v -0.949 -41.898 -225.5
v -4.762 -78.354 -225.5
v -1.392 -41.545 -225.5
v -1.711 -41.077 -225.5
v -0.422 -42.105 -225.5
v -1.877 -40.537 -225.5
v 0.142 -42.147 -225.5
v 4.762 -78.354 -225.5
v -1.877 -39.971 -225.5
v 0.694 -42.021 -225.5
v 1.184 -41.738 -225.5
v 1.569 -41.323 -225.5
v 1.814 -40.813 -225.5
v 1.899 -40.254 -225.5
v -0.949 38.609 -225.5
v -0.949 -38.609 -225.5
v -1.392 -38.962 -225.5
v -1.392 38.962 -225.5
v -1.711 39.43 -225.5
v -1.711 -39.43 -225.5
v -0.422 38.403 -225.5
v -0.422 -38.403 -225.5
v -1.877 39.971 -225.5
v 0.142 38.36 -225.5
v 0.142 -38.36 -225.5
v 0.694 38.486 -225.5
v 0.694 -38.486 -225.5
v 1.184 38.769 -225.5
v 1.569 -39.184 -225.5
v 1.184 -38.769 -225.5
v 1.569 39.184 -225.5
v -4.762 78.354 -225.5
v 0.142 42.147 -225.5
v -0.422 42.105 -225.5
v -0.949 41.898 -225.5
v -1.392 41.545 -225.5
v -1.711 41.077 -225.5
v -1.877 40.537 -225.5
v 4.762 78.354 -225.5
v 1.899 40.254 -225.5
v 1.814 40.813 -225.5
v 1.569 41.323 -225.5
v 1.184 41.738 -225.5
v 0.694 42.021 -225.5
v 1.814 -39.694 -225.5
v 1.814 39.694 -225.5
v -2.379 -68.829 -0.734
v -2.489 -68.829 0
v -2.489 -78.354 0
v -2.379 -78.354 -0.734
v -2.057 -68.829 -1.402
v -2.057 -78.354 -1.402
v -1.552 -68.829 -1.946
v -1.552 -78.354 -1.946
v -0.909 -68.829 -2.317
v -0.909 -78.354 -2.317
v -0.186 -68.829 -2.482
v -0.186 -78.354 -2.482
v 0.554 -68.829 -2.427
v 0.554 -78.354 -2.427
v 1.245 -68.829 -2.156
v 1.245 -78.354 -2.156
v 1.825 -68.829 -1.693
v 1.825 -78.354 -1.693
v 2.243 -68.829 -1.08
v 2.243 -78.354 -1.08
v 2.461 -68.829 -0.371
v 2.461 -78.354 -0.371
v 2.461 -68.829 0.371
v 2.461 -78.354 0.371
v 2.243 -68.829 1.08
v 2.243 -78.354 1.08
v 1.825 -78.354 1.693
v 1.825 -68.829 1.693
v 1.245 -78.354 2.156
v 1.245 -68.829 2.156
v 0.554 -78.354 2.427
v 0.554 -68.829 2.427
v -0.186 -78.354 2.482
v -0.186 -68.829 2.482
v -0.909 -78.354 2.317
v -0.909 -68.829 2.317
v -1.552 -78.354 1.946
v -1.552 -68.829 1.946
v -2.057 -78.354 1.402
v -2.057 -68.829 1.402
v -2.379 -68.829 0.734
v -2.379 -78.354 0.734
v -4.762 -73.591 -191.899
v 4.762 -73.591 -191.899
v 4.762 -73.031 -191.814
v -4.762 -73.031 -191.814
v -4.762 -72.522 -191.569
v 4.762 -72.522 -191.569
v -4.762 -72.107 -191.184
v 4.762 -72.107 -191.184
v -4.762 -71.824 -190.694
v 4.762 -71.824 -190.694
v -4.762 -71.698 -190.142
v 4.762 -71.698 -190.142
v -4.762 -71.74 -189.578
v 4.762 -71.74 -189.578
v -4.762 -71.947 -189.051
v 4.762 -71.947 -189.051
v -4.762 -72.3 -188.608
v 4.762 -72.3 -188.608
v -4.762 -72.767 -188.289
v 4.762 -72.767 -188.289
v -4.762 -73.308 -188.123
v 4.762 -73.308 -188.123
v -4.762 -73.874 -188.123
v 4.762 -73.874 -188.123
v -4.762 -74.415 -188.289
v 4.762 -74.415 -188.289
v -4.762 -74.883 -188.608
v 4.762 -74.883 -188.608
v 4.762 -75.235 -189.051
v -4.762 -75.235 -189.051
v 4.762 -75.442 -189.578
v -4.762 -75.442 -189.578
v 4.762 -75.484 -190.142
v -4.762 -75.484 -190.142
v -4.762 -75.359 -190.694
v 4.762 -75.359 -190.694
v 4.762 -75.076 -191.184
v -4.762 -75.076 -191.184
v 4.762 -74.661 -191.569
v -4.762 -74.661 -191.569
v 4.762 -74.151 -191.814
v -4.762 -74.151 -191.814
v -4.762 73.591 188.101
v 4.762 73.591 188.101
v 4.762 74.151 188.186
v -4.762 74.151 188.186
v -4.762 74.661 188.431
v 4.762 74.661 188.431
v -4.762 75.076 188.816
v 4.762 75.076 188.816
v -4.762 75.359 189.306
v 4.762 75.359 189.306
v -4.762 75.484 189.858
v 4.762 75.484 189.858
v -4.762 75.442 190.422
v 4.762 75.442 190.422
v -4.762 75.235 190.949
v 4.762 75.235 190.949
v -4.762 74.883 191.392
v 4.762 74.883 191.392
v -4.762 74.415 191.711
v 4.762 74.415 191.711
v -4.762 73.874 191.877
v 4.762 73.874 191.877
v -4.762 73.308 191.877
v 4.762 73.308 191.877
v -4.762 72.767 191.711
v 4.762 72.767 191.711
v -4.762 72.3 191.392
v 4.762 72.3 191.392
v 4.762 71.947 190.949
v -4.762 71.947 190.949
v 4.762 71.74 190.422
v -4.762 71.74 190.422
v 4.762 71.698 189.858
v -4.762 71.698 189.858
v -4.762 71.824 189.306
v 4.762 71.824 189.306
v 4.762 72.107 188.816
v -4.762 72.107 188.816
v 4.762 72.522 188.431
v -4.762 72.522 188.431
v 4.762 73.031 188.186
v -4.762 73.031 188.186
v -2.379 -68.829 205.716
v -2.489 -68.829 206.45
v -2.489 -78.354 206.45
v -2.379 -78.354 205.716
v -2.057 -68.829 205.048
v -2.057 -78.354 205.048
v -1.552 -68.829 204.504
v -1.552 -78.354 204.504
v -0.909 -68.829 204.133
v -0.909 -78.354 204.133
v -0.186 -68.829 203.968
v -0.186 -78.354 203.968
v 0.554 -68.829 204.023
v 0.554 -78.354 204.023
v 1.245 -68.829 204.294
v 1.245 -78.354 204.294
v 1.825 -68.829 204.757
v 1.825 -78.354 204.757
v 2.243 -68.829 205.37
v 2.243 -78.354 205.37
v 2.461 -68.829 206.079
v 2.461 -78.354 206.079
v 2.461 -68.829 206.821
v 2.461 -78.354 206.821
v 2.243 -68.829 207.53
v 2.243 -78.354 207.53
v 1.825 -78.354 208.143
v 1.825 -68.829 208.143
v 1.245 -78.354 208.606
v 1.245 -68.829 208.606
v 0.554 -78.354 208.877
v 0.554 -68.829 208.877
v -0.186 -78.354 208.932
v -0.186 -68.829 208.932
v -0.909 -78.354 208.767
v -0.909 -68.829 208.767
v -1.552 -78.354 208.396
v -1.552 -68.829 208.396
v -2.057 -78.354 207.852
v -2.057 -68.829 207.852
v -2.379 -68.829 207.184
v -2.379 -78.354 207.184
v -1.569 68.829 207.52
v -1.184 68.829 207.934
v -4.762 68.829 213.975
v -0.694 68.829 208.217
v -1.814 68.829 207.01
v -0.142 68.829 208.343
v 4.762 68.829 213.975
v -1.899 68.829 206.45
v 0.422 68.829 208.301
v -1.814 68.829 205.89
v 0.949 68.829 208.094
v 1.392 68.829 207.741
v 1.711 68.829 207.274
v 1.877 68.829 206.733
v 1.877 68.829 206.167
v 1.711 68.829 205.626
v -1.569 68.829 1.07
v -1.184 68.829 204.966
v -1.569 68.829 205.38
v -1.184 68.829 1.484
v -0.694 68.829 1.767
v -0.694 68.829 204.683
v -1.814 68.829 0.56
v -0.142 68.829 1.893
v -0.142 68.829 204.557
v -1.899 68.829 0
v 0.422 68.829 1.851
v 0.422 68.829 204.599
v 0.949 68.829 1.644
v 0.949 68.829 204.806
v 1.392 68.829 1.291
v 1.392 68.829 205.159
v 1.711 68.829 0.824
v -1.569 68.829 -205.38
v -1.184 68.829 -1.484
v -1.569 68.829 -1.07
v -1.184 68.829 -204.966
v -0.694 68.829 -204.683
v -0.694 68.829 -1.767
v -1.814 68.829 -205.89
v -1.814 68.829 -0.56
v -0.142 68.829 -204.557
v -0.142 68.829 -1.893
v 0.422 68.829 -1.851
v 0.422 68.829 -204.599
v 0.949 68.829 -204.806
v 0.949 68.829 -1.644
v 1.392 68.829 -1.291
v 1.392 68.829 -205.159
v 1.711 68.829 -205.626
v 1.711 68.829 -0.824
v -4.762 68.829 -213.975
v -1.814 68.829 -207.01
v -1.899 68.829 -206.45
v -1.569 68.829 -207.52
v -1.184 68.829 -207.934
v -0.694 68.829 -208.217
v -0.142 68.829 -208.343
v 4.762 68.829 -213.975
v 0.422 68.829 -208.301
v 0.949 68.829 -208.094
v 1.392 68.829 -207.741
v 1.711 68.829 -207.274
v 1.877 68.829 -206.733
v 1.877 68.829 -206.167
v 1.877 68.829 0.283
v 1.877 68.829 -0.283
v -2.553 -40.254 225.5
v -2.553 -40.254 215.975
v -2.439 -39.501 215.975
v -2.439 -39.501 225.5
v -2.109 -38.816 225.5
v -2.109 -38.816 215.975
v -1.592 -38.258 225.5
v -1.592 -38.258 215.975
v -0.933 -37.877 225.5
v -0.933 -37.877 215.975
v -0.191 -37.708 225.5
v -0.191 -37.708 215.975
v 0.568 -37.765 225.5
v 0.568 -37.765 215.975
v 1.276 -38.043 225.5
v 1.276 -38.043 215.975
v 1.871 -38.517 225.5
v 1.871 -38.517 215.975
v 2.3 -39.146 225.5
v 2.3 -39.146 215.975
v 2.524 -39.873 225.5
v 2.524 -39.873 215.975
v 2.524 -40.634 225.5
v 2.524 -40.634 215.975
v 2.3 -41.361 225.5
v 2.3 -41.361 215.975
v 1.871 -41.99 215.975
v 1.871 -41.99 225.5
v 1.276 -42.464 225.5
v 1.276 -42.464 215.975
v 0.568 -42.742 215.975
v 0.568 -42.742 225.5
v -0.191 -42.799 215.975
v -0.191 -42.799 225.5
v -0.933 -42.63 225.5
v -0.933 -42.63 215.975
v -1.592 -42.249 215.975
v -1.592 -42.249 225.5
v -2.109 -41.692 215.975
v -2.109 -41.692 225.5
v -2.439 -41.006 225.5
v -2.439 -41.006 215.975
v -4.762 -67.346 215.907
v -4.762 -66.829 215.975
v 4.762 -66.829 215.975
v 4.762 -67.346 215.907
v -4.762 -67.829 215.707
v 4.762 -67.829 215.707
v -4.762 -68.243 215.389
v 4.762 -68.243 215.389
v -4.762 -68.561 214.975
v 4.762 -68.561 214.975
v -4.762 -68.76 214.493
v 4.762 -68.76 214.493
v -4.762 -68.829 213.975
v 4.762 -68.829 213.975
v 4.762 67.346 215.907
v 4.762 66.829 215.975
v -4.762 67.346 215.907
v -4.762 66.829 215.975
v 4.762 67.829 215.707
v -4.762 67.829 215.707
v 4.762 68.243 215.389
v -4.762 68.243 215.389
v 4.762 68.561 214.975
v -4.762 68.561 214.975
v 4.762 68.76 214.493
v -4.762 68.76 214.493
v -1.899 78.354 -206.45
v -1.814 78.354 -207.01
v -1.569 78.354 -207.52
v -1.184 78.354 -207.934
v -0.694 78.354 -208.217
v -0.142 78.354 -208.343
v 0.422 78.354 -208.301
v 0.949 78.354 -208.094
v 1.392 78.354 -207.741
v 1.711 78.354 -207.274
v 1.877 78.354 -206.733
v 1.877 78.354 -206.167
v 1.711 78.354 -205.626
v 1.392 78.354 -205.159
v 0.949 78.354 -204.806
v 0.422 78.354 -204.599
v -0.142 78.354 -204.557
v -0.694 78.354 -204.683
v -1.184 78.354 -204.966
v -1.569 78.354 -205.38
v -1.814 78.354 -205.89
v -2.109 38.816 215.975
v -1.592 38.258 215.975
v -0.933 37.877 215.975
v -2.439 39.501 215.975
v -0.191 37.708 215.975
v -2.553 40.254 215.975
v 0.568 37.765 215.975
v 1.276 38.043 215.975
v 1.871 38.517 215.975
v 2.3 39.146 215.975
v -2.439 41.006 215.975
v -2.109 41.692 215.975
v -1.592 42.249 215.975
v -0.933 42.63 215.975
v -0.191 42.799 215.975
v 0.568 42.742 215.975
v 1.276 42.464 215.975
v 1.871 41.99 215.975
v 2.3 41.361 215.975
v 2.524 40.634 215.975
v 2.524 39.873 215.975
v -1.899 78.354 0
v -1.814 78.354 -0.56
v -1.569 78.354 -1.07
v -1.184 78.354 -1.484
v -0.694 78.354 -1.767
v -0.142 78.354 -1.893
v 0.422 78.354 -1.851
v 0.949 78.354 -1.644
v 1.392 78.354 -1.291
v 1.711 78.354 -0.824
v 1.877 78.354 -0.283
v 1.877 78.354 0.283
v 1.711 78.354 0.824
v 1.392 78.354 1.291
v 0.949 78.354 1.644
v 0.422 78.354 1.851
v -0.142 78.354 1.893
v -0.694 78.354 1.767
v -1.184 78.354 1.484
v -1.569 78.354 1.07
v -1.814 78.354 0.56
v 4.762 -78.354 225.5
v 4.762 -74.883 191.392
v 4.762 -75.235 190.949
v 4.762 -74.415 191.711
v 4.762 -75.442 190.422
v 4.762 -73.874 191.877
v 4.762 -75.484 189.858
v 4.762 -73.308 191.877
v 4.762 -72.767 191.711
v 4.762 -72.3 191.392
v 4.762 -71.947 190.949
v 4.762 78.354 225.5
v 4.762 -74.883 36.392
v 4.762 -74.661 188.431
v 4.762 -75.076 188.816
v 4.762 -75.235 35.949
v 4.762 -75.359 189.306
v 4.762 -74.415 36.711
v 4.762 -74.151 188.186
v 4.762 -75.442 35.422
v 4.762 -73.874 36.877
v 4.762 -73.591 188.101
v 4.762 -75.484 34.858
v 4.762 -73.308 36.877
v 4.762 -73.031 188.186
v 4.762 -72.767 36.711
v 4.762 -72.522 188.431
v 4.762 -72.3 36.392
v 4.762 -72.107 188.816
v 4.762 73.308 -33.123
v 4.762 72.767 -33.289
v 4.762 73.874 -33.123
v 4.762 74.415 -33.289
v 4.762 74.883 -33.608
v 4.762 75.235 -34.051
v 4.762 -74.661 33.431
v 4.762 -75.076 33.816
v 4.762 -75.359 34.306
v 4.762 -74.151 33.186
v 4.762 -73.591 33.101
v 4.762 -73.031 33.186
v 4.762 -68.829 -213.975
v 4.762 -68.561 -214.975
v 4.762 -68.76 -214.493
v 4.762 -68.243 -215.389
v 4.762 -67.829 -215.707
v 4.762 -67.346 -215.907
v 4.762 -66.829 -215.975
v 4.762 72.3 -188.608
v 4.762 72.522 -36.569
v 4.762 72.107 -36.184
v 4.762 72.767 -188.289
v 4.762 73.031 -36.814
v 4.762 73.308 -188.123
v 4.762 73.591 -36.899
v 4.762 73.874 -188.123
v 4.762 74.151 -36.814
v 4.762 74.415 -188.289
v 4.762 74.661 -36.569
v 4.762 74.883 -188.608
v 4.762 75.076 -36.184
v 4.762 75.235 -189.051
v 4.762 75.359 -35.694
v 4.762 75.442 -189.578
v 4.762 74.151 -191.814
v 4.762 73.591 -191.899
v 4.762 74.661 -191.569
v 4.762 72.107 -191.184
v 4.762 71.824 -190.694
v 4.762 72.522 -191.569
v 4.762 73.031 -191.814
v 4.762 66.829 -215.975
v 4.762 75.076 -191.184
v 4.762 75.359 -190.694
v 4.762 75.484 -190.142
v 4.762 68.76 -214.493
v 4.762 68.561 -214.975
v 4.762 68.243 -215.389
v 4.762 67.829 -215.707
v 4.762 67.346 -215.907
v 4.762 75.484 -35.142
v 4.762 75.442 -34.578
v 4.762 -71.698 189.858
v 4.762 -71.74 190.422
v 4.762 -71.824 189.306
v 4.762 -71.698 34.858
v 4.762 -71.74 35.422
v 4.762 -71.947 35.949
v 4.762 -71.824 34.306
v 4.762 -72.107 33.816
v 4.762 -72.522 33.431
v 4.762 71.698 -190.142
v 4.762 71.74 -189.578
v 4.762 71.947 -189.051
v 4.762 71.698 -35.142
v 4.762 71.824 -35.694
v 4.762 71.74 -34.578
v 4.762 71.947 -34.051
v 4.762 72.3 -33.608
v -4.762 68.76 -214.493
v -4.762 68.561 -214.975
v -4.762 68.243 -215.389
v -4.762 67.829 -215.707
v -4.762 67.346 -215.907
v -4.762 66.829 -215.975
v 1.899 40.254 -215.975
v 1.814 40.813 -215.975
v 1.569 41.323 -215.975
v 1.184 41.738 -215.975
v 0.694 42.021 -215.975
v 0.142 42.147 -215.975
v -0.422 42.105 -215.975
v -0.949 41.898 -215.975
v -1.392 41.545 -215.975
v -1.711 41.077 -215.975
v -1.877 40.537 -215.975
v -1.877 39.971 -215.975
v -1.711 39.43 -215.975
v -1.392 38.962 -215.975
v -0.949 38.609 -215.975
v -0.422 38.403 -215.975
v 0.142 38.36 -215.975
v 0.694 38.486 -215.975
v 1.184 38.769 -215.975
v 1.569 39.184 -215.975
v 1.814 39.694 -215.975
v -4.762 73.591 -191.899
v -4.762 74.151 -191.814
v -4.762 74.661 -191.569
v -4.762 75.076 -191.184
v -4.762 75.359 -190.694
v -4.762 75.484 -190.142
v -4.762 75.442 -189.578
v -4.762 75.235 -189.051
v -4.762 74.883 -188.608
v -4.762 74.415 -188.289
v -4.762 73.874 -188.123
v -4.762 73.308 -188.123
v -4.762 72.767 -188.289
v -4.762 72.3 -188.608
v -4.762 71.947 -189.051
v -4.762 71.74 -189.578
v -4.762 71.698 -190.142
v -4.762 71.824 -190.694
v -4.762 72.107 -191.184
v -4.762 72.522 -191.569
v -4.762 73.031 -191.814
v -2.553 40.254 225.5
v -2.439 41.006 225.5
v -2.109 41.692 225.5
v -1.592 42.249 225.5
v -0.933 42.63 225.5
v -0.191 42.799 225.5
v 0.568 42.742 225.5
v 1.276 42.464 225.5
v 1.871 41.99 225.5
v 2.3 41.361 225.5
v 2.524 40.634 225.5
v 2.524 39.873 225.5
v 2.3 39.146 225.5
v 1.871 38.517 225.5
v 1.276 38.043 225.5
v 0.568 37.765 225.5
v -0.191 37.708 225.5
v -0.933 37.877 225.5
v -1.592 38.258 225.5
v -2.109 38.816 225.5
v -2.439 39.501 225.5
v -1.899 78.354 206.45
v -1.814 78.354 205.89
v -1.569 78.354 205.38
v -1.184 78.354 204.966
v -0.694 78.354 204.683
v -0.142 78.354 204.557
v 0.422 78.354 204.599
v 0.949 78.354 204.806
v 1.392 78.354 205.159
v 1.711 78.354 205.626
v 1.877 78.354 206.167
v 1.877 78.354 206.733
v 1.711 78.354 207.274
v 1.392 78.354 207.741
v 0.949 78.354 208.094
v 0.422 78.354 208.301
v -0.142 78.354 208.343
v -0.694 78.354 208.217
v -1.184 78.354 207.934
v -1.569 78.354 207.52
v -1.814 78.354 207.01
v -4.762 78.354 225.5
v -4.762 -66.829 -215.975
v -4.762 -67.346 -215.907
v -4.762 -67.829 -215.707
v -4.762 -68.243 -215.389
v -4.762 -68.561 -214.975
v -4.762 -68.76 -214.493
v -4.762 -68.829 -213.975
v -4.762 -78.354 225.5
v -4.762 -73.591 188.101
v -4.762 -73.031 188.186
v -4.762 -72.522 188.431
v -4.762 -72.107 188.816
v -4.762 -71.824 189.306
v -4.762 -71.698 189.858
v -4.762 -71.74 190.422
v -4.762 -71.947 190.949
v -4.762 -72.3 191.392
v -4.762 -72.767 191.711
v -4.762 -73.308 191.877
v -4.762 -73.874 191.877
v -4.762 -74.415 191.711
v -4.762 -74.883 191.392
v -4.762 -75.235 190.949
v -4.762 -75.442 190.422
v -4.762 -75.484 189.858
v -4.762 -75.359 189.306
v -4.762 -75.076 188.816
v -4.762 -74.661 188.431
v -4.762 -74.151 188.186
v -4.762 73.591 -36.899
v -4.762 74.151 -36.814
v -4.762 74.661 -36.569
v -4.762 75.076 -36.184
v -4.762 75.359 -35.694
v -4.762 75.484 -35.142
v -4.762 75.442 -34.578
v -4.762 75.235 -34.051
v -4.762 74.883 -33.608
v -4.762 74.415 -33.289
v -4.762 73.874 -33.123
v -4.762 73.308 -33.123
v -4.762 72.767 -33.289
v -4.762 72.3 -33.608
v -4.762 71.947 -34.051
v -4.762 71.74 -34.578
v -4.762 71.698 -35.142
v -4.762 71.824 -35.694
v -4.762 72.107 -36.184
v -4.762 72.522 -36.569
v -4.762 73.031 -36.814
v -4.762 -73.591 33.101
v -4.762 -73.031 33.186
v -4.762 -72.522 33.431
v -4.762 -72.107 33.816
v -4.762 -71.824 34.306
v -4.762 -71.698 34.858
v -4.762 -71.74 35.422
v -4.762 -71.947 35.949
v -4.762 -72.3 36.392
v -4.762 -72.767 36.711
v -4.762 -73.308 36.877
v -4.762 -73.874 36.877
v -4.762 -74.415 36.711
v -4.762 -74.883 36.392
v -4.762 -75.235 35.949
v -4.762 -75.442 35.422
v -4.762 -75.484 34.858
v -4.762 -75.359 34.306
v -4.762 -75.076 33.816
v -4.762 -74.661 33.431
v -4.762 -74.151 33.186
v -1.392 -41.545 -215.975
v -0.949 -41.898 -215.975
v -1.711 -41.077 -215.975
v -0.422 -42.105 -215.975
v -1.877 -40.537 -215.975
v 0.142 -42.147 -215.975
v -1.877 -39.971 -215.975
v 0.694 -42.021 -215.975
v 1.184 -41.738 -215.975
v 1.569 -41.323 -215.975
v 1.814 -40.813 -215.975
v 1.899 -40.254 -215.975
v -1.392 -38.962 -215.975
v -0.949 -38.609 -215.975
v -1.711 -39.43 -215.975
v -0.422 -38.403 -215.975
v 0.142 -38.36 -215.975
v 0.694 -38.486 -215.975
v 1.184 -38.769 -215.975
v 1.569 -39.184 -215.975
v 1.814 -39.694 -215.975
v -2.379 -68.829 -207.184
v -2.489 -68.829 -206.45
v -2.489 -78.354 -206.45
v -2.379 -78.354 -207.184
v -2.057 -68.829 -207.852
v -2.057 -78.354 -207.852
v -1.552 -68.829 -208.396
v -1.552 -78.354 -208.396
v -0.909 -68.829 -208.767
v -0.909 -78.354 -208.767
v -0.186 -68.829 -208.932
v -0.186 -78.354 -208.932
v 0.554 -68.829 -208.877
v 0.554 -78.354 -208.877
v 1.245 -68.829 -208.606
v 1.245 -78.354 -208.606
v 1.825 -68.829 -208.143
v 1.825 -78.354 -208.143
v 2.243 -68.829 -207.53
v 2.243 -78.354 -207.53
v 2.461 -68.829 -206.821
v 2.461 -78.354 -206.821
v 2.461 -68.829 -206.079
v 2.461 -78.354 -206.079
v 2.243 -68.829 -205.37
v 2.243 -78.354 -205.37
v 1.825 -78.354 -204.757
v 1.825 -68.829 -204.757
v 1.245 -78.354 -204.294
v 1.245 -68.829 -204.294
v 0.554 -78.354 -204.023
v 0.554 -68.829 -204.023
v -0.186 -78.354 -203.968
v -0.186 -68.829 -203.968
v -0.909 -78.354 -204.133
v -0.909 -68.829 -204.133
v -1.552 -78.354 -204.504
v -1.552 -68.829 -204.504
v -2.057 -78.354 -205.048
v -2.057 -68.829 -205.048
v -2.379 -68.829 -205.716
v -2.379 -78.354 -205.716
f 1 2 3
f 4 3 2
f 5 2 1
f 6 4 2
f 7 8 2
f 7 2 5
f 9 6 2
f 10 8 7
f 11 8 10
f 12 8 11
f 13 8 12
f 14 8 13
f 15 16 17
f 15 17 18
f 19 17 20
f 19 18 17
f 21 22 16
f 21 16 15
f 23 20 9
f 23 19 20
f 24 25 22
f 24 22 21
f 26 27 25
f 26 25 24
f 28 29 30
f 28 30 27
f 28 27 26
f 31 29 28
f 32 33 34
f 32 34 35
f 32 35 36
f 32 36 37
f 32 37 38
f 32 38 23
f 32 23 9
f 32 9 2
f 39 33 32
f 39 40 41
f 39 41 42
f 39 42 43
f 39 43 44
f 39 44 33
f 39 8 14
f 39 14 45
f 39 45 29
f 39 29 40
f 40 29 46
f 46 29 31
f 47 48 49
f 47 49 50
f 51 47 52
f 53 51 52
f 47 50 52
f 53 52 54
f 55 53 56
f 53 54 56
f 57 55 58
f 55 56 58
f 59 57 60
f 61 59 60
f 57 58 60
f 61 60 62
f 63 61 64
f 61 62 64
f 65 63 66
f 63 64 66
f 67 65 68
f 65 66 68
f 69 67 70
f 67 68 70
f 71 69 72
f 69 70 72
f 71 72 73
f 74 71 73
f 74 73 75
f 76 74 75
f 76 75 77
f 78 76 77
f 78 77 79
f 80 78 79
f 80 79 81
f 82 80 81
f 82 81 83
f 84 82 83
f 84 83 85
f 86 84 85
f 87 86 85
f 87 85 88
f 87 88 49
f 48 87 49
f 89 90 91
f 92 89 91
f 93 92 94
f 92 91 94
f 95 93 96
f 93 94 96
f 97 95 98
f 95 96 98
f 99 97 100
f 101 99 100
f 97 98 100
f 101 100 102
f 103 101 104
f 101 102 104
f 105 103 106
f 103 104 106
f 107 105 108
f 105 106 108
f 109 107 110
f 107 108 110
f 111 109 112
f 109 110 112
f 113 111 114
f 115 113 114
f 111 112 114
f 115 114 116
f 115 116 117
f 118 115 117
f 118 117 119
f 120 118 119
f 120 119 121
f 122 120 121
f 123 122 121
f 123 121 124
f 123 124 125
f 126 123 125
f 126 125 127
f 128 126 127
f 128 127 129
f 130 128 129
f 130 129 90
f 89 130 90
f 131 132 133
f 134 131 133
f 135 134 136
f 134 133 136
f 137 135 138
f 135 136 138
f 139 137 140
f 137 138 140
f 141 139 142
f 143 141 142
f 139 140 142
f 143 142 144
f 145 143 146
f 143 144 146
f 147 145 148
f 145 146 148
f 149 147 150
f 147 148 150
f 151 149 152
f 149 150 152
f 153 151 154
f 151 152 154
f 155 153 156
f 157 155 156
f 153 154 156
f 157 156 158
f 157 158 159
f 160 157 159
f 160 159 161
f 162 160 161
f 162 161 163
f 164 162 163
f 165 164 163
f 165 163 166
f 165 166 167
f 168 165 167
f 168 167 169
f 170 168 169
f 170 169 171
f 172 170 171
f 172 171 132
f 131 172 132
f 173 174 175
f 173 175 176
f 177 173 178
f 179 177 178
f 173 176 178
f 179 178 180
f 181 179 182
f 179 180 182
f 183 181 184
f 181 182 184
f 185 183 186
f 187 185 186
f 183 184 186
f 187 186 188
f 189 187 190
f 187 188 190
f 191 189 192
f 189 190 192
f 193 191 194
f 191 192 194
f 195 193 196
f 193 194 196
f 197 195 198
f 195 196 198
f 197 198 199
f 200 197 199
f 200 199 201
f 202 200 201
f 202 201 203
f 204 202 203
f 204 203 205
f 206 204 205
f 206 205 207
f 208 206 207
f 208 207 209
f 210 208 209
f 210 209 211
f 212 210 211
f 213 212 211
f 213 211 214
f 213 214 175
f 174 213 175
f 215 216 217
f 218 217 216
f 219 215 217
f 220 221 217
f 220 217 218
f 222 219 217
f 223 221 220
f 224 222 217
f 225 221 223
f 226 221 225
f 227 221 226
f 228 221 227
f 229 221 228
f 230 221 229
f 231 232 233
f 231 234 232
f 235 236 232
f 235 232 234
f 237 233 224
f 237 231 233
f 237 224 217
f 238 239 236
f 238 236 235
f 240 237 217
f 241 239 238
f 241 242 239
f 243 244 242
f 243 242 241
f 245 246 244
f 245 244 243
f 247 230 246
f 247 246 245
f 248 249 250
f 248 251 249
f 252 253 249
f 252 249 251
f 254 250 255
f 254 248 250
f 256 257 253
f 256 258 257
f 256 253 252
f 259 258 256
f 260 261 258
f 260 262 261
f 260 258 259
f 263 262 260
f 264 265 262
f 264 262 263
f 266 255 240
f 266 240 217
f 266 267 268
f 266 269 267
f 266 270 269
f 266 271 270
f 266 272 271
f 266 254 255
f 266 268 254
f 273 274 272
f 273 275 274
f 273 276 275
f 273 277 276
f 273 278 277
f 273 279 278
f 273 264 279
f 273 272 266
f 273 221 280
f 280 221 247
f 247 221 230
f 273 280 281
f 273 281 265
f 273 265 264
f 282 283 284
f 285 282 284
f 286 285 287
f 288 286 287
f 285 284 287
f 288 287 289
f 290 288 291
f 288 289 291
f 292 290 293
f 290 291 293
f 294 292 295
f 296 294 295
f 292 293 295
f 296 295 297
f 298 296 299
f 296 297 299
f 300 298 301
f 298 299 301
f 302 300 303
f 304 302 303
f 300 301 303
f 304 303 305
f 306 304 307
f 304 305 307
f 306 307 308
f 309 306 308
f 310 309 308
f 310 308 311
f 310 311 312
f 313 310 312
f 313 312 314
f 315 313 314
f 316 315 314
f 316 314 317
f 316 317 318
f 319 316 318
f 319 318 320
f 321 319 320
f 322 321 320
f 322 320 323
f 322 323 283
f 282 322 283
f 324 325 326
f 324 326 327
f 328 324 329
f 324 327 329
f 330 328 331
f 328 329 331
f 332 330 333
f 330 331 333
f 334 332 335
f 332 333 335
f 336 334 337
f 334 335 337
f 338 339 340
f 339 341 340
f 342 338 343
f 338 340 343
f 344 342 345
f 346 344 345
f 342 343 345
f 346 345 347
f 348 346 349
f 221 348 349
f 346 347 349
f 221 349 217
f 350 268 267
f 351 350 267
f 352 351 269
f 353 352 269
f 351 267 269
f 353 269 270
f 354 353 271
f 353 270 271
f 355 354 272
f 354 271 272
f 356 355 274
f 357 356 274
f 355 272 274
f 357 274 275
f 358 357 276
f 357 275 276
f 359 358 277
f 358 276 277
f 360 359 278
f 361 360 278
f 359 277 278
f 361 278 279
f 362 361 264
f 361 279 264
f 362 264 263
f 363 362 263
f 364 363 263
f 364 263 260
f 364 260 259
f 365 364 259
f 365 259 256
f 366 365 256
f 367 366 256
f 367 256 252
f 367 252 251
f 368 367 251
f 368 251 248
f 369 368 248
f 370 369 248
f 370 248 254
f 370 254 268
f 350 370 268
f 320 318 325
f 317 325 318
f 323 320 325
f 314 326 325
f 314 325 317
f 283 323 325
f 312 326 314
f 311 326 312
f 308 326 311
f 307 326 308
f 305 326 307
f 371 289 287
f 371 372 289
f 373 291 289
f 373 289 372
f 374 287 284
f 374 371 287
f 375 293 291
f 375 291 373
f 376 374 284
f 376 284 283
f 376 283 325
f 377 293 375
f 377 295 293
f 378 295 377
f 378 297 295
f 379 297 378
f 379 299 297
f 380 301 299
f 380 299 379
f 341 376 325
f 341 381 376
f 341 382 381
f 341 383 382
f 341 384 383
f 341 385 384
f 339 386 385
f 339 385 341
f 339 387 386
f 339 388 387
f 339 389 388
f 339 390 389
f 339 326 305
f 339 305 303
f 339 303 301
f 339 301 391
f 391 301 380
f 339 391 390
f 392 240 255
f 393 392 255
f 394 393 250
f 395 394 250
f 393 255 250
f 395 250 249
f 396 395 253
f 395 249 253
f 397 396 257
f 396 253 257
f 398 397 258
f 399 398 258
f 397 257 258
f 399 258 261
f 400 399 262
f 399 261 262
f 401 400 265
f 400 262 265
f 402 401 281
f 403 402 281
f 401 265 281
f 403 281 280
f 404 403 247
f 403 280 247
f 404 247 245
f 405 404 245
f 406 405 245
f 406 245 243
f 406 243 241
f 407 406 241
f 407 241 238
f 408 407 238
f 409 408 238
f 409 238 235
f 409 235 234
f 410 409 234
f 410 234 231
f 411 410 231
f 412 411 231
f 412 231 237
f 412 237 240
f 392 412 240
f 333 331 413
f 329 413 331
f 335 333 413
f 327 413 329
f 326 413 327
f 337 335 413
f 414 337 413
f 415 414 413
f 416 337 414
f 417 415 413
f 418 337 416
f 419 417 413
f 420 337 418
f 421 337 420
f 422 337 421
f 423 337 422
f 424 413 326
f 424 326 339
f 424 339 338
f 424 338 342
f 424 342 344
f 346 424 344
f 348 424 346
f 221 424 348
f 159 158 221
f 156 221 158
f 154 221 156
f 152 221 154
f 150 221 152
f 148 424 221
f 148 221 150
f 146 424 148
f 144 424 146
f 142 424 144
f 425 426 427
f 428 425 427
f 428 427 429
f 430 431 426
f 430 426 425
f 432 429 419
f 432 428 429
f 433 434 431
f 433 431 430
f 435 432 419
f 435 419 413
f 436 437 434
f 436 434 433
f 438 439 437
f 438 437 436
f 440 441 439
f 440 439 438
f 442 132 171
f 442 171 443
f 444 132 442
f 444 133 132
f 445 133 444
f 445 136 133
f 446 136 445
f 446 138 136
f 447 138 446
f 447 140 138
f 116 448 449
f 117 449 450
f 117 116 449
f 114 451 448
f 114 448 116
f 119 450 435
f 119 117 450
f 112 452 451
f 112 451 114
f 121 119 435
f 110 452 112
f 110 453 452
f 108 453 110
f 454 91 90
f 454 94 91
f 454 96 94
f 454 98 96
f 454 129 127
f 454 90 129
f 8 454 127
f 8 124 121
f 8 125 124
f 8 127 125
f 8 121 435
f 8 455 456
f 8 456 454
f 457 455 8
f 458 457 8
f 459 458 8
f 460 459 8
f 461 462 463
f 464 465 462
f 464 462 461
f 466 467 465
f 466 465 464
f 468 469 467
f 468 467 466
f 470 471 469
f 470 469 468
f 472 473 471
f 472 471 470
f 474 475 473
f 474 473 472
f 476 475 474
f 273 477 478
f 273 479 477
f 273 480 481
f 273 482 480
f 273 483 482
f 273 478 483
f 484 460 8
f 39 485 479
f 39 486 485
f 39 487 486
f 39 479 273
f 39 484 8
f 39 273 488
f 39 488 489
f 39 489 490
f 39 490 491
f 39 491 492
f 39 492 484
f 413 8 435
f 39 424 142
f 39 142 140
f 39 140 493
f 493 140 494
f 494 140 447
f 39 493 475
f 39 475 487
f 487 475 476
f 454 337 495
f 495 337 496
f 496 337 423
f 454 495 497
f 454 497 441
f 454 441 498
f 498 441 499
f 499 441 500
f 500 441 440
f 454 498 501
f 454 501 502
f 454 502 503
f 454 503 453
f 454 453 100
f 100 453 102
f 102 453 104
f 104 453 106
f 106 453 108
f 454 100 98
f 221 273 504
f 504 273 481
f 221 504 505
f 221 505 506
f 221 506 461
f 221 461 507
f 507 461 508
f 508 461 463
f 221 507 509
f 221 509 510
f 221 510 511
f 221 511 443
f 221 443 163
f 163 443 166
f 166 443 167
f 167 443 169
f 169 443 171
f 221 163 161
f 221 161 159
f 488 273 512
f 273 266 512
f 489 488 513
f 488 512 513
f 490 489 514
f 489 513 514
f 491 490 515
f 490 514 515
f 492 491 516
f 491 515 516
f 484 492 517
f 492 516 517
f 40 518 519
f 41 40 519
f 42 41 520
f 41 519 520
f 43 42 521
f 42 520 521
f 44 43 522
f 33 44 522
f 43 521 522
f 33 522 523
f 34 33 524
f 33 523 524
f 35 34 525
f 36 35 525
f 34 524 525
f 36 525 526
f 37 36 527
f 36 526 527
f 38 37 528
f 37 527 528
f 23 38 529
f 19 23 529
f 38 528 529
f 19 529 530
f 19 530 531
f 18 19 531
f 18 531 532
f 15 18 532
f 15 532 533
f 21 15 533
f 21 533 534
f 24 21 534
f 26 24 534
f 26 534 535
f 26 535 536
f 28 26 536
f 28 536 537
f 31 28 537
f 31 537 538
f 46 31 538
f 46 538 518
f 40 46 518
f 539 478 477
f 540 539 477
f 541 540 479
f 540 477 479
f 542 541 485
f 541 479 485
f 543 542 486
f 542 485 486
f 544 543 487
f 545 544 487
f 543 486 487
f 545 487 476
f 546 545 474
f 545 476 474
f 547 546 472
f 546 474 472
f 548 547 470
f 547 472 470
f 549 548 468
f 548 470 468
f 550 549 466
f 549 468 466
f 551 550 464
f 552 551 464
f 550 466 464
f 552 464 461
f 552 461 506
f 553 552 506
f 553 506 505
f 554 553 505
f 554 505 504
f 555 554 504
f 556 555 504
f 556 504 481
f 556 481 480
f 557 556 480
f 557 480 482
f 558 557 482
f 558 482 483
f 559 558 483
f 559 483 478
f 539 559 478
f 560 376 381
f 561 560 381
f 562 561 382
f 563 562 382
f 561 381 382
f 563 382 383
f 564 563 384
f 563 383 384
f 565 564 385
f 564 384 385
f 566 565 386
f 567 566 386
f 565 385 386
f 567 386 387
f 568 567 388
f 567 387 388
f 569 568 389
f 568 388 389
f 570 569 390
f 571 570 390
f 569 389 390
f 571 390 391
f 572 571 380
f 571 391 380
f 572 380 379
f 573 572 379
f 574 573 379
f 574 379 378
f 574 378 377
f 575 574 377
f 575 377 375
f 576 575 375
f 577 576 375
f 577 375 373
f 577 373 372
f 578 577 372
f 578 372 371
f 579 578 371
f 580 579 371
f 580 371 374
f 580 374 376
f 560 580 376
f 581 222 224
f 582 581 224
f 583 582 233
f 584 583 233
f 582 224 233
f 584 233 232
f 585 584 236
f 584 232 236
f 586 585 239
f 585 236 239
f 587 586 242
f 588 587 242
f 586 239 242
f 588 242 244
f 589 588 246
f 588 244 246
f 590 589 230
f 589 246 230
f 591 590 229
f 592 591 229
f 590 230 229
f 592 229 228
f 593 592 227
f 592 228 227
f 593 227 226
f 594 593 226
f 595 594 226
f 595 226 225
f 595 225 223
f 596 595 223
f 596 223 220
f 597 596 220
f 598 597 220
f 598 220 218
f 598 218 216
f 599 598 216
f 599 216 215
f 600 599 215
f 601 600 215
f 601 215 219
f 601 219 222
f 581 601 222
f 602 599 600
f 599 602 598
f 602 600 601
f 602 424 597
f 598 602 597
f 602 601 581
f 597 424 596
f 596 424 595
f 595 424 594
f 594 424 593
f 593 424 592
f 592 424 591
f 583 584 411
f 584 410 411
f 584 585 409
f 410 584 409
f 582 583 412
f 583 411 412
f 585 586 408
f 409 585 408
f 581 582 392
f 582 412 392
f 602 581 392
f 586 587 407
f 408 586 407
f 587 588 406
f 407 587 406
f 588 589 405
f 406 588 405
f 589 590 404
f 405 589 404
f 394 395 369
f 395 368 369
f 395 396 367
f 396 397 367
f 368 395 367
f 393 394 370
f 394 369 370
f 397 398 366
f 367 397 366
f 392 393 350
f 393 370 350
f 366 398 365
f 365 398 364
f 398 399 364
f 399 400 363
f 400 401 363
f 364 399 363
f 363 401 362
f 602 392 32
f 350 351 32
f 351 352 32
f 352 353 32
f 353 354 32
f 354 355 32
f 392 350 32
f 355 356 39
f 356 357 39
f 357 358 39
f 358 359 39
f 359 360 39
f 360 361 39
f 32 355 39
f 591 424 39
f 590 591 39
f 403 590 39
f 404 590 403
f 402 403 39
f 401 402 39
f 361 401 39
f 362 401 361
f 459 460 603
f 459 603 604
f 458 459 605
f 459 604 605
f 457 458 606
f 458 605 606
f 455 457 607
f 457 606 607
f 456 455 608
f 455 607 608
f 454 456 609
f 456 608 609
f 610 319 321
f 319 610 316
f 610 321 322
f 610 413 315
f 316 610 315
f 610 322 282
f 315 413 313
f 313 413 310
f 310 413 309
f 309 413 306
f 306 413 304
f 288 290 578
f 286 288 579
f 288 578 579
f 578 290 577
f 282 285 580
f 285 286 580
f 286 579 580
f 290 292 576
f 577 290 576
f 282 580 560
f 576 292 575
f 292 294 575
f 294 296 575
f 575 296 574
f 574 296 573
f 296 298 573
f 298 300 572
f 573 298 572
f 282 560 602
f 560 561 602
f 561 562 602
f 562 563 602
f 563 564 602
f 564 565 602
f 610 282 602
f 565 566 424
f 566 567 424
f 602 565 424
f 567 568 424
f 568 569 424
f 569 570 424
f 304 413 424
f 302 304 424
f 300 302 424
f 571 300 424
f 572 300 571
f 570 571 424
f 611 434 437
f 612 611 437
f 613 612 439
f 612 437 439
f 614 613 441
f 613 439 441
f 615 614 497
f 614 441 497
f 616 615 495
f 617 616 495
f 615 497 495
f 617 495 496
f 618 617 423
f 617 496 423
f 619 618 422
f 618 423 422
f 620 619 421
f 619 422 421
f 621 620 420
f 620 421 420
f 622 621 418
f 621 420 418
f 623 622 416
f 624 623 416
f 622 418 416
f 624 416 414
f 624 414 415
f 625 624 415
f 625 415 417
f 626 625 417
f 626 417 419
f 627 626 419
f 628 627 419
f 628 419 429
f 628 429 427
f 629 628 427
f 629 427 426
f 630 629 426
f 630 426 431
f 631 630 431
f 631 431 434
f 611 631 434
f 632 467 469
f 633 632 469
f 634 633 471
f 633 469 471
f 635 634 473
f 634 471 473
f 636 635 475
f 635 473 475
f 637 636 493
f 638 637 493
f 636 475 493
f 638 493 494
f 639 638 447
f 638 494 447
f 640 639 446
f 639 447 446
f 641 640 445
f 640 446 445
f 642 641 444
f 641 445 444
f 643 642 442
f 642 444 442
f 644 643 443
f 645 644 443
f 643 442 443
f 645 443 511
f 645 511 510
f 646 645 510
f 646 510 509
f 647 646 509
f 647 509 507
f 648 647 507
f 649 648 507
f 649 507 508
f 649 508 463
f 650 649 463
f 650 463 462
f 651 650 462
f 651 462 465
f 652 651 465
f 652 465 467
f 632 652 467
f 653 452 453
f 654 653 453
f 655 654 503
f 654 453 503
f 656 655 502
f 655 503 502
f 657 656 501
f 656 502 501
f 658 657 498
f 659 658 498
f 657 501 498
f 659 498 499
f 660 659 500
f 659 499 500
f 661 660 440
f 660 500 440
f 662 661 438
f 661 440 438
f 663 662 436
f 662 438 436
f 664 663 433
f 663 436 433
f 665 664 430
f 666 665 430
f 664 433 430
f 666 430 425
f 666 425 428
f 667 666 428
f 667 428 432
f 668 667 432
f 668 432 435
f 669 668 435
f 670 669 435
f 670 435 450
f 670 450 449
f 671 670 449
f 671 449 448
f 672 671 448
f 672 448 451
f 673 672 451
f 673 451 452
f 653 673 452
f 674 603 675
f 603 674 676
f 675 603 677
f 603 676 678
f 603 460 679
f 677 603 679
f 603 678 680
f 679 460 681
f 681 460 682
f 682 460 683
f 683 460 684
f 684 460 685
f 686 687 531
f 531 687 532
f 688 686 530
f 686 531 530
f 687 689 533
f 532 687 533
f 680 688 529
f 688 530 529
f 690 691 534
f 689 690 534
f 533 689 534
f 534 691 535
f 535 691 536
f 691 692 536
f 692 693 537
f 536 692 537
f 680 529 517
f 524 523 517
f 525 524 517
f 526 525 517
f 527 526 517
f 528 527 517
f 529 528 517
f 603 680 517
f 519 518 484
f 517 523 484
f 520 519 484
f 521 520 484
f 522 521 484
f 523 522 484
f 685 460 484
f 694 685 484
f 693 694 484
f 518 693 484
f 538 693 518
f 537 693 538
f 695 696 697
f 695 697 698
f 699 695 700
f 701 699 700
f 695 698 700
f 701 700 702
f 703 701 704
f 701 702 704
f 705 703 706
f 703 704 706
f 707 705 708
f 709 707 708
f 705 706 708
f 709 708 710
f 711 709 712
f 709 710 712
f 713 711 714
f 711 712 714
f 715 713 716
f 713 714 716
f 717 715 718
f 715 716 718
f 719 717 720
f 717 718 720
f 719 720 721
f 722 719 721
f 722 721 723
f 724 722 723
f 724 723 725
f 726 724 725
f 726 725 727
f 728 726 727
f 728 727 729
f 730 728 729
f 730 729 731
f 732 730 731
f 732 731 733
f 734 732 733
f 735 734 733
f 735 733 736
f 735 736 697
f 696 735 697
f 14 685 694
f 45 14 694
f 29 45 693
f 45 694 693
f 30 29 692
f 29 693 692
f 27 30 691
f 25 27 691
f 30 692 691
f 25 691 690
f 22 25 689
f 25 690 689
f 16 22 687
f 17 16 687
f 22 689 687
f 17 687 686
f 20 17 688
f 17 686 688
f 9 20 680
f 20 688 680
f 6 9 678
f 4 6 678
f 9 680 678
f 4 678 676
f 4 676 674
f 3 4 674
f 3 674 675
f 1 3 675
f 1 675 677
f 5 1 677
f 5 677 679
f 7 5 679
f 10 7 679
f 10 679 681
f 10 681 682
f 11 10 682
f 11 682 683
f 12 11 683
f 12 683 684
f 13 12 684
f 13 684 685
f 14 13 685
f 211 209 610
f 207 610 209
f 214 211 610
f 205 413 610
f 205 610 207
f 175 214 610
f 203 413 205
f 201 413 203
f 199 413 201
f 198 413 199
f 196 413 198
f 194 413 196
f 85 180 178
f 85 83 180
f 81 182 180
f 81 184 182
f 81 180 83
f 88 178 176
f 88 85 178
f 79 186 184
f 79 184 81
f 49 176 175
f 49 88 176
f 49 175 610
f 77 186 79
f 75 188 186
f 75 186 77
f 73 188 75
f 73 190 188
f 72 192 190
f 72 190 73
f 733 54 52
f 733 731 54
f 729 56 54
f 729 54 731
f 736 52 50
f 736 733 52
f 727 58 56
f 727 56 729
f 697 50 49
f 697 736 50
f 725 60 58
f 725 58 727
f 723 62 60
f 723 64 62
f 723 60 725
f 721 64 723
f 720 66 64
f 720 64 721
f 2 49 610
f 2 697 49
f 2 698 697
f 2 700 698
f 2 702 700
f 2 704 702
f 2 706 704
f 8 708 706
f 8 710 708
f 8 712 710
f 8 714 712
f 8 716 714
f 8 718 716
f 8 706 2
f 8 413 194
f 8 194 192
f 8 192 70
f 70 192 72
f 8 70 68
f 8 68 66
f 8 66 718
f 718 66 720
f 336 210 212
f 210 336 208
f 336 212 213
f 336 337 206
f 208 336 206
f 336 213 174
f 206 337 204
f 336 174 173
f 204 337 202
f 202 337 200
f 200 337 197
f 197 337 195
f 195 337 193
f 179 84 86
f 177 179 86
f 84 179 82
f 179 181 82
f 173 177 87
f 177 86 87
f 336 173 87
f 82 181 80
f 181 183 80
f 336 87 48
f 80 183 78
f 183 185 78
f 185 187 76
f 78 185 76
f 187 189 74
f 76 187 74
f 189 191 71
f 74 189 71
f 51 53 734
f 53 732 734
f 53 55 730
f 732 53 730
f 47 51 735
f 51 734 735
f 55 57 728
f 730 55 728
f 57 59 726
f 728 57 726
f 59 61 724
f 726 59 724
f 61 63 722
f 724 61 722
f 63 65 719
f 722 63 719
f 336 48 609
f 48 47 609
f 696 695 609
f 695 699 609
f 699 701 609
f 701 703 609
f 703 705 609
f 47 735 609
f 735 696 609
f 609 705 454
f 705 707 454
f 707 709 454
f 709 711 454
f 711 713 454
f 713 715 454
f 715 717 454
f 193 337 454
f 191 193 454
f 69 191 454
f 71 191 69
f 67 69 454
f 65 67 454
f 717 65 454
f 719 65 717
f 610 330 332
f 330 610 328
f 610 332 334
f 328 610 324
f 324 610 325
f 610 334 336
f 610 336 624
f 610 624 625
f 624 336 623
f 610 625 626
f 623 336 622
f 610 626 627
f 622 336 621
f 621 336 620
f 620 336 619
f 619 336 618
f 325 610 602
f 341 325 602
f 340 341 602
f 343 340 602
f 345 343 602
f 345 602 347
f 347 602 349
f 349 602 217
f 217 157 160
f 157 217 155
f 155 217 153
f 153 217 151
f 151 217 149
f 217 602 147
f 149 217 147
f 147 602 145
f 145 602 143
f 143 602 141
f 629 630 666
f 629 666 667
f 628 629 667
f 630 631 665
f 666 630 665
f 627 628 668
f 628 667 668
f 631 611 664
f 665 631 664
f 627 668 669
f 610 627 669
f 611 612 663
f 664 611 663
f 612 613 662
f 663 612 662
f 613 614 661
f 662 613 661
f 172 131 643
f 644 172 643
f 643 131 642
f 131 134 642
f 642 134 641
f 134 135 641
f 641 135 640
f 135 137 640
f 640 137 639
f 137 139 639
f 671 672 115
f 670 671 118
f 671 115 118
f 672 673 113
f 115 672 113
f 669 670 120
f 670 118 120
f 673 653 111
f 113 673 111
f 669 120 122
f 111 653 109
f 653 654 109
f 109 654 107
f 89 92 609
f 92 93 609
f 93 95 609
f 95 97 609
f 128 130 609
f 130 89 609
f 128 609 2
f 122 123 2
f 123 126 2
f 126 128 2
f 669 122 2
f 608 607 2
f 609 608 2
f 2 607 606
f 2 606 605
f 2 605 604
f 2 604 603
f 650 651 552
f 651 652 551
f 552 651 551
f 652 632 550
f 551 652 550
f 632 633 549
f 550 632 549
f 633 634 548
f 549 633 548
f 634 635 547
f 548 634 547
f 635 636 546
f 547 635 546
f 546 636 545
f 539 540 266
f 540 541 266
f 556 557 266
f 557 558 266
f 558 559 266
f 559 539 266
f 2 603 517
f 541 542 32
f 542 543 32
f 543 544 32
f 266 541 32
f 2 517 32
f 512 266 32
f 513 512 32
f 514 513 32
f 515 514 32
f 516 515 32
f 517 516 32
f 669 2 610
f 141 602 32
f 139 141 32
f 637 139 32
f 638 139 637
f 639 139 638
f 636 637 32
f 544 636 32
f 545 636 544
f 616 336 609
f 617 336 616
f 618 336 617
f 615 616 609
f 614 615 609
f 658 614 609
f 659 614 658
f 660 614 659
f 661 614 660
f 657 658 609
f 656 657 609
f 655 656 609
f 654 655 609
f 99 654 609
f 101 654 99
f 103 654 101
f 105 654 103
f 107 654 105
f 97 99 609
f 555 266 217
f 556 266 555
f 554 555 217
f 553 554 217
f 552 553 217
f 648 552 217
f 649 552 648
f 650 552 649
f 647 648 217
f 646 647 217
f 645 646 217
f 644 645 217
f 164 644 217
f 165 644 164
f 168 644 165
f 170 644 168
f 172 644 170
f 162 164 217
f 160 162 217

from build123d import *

# Parameters (mm, degrees)
SKETCH1_W                  = 451
SKETCH1_H                  = 156.7072167
SKETCH1_W_2                = 431.95
SKETCH1_H_2                = 137.6572167
EXTRUDE_THIN1_DEPTH        = 4.7625
FILLET1_R                  = 2
F_10_CLEARANCE_HOLE1_D     = 4.9784
F_10_CLEARANCE_HOLE1_DEPTH = 9.525
F_10_24_TAPPED_HOLE1_D     = 3.7973
F_10_24_TAPPED_HOLE1_DEPTH = 250.46
F_10_24_TAPPED_HOLE1_TIP   = 1.140824014
F_10_CLEARANCE_HOLE2_D     = 5.1054
F_10_CLEARANCE_HOLE2_DEPTH = 20
F_10_CLEARANCE_HOLE2_TIP   = 1.533816902
F_10_24_TAPPED_HOLE2_D     = 3.7973
F_10_24_TAPPED_HOLE2_DEPTH = 14.95
F_10_24_TAPPED_HOLE2_TIP   = 1.140824014
F_10_24_TAPPED_HOLE3_D     = 3.7973
F_10_24_TAPPED_HOLE3_DEPTH = 14.95
F_10_24_TAPPED_HOLE3_TIP   = 1.140824014


with BuildPart() as part:
    # Sketch1 → Extrude-Thin1 (new body, symmetric)
    with BuildSketch(Plane(origin=(0, 0, 0), x_dir=(0, 0, -1), z_dir=(1, 0, 0))):
        Rectangle(SKETCH1_W, SKETCH1_H)
        Rectangle(SKETCH1_W_2, SKETCH1_H_2, mode=Mode.SUBTRACT)
    extrude(amount=EXTRUDE_THIN1_DEPTH, both=True)

    # Fillet1
    fillet1_edges = [part.edges().sort_by_distance(p)[0] for p in [
        (0, 68.82860835, 215.975),
        (0, -68.82860835, 215.975),
        (0, -68.82860835, -215.975),
        (0, 68.82860835, -215.975),
    ]]
    fillet(fillet1_edges, radius=FILLET1_R)

    # #10 Clearance Hole1
    with Locations(Plane(origin=(0, -68.82860835, 0), x_dir=(1, 0, 0), z_dir=(0, 1, 0))):
        with Locations((0, 206.45), (0, 0), (0, -206.45)):
            Hole(F_10_CLEARANCE_HOLE1_D / 2, depth=F_10_CLEARANCE_HOLE1_DEPTH)

    # #10-24 Tapped Hole1
    with Locations(Plane(origin=(0, 0, -225.5), x_dir=(-1, 0, 0), z_dir=(0, 0, -1))):
        with Locations((0, 40.25360835), (0, -40.25360835)):
            Hole(F_10_24_TAPPED_HOLE1_D / 2, depth=F_10_24_TAPPED_HOLE1_DEPTH)
            with Locations((0, 0, -(F_10_24_TAPPED_HOLE1_DEPTH + F_10_24_TAPPED_HOLE1_TIP / 2))):  # 118° drill point
                Cone(0, F_10_24_TAPPED_HOLE1_D / 2, F_10_24_TAPPED_HOLE1_TIP, mode=Mode.SUBTRACT)

    # #10 Clearance Hole2
    with Locations(Plane.XY.offset(225.5)):
        with Locations((0, 40.25360835), (0, -40.25360835)):
            Hole(F_10_CLEARANCE_HOLE2_D / 2, depth=F_10_CLEARANCE_HOLE2_DEPTH)
            with Locations((0, 0, -(F_10_CLEARANCE_HOLE2_DEPTH + F_10_CLEARANCE_HOLE2_TIP / 2))):  # 118° drill point
                Cone(0, F_10_CLEARANCE_HOLE2_D / 2, F_10_CLEARANCE_HOLE2_TIP, mode=Mode.SUBTRACT)

    # #10-24 Tapped Hole2
    with Locations(Plane.ZY.offset(4.7625)):
        with Locations((-190, 73.59110835), (-35, 73.59110835), (-190, -73.59110835), (35, -73.59110835), (190, -73.59110835), (190, 73.59110835)):
            Hole(F_10_24_TAPPED_HOLE2_D / 2, depth=F_10_24_TAPPED_HOLE2_DEPTH)
            with Locations((0, 0, -(F_10_24_TAPPED_HOLE2_DEPTH + F_10_24_TAPPED_HOLE2_TIP / 2))):  # 118° drill point
                Cone(0, F_10_24_TAPPED_HOLE2_D / 2, F_10_24_TAPPED_HOLE2_TIP, mode=Mode.SUBTRACT)

    # #10-24 Tapped Hole3
    with Locations(Plane(origin=(0, 78.35360835, 0), x_dir=(1, 0, 0), z_dir=(0, 1, 0))):
        with Locations((0, 206.45), (0, 0), (0, -206.45)):
            Hole(F_10_24_TAPPED_HOLE3_D / 2, depth=F_10_24_TAPPED_HOLE3_DEPTH)
            with Locations((0, 0, -(F_10_24_TAPPED_HOLE3_DEPTH + F_10_24_TAPPED_HOLE3_TIP / 2))):  # 118° drill point
                Cone(0, F_10_24_TAPPED_HOLE3_D / 2, F_10_24_TAPPED_HOLE3_TIP, mode=Mode.SUBTRACT)


solid = part.part
